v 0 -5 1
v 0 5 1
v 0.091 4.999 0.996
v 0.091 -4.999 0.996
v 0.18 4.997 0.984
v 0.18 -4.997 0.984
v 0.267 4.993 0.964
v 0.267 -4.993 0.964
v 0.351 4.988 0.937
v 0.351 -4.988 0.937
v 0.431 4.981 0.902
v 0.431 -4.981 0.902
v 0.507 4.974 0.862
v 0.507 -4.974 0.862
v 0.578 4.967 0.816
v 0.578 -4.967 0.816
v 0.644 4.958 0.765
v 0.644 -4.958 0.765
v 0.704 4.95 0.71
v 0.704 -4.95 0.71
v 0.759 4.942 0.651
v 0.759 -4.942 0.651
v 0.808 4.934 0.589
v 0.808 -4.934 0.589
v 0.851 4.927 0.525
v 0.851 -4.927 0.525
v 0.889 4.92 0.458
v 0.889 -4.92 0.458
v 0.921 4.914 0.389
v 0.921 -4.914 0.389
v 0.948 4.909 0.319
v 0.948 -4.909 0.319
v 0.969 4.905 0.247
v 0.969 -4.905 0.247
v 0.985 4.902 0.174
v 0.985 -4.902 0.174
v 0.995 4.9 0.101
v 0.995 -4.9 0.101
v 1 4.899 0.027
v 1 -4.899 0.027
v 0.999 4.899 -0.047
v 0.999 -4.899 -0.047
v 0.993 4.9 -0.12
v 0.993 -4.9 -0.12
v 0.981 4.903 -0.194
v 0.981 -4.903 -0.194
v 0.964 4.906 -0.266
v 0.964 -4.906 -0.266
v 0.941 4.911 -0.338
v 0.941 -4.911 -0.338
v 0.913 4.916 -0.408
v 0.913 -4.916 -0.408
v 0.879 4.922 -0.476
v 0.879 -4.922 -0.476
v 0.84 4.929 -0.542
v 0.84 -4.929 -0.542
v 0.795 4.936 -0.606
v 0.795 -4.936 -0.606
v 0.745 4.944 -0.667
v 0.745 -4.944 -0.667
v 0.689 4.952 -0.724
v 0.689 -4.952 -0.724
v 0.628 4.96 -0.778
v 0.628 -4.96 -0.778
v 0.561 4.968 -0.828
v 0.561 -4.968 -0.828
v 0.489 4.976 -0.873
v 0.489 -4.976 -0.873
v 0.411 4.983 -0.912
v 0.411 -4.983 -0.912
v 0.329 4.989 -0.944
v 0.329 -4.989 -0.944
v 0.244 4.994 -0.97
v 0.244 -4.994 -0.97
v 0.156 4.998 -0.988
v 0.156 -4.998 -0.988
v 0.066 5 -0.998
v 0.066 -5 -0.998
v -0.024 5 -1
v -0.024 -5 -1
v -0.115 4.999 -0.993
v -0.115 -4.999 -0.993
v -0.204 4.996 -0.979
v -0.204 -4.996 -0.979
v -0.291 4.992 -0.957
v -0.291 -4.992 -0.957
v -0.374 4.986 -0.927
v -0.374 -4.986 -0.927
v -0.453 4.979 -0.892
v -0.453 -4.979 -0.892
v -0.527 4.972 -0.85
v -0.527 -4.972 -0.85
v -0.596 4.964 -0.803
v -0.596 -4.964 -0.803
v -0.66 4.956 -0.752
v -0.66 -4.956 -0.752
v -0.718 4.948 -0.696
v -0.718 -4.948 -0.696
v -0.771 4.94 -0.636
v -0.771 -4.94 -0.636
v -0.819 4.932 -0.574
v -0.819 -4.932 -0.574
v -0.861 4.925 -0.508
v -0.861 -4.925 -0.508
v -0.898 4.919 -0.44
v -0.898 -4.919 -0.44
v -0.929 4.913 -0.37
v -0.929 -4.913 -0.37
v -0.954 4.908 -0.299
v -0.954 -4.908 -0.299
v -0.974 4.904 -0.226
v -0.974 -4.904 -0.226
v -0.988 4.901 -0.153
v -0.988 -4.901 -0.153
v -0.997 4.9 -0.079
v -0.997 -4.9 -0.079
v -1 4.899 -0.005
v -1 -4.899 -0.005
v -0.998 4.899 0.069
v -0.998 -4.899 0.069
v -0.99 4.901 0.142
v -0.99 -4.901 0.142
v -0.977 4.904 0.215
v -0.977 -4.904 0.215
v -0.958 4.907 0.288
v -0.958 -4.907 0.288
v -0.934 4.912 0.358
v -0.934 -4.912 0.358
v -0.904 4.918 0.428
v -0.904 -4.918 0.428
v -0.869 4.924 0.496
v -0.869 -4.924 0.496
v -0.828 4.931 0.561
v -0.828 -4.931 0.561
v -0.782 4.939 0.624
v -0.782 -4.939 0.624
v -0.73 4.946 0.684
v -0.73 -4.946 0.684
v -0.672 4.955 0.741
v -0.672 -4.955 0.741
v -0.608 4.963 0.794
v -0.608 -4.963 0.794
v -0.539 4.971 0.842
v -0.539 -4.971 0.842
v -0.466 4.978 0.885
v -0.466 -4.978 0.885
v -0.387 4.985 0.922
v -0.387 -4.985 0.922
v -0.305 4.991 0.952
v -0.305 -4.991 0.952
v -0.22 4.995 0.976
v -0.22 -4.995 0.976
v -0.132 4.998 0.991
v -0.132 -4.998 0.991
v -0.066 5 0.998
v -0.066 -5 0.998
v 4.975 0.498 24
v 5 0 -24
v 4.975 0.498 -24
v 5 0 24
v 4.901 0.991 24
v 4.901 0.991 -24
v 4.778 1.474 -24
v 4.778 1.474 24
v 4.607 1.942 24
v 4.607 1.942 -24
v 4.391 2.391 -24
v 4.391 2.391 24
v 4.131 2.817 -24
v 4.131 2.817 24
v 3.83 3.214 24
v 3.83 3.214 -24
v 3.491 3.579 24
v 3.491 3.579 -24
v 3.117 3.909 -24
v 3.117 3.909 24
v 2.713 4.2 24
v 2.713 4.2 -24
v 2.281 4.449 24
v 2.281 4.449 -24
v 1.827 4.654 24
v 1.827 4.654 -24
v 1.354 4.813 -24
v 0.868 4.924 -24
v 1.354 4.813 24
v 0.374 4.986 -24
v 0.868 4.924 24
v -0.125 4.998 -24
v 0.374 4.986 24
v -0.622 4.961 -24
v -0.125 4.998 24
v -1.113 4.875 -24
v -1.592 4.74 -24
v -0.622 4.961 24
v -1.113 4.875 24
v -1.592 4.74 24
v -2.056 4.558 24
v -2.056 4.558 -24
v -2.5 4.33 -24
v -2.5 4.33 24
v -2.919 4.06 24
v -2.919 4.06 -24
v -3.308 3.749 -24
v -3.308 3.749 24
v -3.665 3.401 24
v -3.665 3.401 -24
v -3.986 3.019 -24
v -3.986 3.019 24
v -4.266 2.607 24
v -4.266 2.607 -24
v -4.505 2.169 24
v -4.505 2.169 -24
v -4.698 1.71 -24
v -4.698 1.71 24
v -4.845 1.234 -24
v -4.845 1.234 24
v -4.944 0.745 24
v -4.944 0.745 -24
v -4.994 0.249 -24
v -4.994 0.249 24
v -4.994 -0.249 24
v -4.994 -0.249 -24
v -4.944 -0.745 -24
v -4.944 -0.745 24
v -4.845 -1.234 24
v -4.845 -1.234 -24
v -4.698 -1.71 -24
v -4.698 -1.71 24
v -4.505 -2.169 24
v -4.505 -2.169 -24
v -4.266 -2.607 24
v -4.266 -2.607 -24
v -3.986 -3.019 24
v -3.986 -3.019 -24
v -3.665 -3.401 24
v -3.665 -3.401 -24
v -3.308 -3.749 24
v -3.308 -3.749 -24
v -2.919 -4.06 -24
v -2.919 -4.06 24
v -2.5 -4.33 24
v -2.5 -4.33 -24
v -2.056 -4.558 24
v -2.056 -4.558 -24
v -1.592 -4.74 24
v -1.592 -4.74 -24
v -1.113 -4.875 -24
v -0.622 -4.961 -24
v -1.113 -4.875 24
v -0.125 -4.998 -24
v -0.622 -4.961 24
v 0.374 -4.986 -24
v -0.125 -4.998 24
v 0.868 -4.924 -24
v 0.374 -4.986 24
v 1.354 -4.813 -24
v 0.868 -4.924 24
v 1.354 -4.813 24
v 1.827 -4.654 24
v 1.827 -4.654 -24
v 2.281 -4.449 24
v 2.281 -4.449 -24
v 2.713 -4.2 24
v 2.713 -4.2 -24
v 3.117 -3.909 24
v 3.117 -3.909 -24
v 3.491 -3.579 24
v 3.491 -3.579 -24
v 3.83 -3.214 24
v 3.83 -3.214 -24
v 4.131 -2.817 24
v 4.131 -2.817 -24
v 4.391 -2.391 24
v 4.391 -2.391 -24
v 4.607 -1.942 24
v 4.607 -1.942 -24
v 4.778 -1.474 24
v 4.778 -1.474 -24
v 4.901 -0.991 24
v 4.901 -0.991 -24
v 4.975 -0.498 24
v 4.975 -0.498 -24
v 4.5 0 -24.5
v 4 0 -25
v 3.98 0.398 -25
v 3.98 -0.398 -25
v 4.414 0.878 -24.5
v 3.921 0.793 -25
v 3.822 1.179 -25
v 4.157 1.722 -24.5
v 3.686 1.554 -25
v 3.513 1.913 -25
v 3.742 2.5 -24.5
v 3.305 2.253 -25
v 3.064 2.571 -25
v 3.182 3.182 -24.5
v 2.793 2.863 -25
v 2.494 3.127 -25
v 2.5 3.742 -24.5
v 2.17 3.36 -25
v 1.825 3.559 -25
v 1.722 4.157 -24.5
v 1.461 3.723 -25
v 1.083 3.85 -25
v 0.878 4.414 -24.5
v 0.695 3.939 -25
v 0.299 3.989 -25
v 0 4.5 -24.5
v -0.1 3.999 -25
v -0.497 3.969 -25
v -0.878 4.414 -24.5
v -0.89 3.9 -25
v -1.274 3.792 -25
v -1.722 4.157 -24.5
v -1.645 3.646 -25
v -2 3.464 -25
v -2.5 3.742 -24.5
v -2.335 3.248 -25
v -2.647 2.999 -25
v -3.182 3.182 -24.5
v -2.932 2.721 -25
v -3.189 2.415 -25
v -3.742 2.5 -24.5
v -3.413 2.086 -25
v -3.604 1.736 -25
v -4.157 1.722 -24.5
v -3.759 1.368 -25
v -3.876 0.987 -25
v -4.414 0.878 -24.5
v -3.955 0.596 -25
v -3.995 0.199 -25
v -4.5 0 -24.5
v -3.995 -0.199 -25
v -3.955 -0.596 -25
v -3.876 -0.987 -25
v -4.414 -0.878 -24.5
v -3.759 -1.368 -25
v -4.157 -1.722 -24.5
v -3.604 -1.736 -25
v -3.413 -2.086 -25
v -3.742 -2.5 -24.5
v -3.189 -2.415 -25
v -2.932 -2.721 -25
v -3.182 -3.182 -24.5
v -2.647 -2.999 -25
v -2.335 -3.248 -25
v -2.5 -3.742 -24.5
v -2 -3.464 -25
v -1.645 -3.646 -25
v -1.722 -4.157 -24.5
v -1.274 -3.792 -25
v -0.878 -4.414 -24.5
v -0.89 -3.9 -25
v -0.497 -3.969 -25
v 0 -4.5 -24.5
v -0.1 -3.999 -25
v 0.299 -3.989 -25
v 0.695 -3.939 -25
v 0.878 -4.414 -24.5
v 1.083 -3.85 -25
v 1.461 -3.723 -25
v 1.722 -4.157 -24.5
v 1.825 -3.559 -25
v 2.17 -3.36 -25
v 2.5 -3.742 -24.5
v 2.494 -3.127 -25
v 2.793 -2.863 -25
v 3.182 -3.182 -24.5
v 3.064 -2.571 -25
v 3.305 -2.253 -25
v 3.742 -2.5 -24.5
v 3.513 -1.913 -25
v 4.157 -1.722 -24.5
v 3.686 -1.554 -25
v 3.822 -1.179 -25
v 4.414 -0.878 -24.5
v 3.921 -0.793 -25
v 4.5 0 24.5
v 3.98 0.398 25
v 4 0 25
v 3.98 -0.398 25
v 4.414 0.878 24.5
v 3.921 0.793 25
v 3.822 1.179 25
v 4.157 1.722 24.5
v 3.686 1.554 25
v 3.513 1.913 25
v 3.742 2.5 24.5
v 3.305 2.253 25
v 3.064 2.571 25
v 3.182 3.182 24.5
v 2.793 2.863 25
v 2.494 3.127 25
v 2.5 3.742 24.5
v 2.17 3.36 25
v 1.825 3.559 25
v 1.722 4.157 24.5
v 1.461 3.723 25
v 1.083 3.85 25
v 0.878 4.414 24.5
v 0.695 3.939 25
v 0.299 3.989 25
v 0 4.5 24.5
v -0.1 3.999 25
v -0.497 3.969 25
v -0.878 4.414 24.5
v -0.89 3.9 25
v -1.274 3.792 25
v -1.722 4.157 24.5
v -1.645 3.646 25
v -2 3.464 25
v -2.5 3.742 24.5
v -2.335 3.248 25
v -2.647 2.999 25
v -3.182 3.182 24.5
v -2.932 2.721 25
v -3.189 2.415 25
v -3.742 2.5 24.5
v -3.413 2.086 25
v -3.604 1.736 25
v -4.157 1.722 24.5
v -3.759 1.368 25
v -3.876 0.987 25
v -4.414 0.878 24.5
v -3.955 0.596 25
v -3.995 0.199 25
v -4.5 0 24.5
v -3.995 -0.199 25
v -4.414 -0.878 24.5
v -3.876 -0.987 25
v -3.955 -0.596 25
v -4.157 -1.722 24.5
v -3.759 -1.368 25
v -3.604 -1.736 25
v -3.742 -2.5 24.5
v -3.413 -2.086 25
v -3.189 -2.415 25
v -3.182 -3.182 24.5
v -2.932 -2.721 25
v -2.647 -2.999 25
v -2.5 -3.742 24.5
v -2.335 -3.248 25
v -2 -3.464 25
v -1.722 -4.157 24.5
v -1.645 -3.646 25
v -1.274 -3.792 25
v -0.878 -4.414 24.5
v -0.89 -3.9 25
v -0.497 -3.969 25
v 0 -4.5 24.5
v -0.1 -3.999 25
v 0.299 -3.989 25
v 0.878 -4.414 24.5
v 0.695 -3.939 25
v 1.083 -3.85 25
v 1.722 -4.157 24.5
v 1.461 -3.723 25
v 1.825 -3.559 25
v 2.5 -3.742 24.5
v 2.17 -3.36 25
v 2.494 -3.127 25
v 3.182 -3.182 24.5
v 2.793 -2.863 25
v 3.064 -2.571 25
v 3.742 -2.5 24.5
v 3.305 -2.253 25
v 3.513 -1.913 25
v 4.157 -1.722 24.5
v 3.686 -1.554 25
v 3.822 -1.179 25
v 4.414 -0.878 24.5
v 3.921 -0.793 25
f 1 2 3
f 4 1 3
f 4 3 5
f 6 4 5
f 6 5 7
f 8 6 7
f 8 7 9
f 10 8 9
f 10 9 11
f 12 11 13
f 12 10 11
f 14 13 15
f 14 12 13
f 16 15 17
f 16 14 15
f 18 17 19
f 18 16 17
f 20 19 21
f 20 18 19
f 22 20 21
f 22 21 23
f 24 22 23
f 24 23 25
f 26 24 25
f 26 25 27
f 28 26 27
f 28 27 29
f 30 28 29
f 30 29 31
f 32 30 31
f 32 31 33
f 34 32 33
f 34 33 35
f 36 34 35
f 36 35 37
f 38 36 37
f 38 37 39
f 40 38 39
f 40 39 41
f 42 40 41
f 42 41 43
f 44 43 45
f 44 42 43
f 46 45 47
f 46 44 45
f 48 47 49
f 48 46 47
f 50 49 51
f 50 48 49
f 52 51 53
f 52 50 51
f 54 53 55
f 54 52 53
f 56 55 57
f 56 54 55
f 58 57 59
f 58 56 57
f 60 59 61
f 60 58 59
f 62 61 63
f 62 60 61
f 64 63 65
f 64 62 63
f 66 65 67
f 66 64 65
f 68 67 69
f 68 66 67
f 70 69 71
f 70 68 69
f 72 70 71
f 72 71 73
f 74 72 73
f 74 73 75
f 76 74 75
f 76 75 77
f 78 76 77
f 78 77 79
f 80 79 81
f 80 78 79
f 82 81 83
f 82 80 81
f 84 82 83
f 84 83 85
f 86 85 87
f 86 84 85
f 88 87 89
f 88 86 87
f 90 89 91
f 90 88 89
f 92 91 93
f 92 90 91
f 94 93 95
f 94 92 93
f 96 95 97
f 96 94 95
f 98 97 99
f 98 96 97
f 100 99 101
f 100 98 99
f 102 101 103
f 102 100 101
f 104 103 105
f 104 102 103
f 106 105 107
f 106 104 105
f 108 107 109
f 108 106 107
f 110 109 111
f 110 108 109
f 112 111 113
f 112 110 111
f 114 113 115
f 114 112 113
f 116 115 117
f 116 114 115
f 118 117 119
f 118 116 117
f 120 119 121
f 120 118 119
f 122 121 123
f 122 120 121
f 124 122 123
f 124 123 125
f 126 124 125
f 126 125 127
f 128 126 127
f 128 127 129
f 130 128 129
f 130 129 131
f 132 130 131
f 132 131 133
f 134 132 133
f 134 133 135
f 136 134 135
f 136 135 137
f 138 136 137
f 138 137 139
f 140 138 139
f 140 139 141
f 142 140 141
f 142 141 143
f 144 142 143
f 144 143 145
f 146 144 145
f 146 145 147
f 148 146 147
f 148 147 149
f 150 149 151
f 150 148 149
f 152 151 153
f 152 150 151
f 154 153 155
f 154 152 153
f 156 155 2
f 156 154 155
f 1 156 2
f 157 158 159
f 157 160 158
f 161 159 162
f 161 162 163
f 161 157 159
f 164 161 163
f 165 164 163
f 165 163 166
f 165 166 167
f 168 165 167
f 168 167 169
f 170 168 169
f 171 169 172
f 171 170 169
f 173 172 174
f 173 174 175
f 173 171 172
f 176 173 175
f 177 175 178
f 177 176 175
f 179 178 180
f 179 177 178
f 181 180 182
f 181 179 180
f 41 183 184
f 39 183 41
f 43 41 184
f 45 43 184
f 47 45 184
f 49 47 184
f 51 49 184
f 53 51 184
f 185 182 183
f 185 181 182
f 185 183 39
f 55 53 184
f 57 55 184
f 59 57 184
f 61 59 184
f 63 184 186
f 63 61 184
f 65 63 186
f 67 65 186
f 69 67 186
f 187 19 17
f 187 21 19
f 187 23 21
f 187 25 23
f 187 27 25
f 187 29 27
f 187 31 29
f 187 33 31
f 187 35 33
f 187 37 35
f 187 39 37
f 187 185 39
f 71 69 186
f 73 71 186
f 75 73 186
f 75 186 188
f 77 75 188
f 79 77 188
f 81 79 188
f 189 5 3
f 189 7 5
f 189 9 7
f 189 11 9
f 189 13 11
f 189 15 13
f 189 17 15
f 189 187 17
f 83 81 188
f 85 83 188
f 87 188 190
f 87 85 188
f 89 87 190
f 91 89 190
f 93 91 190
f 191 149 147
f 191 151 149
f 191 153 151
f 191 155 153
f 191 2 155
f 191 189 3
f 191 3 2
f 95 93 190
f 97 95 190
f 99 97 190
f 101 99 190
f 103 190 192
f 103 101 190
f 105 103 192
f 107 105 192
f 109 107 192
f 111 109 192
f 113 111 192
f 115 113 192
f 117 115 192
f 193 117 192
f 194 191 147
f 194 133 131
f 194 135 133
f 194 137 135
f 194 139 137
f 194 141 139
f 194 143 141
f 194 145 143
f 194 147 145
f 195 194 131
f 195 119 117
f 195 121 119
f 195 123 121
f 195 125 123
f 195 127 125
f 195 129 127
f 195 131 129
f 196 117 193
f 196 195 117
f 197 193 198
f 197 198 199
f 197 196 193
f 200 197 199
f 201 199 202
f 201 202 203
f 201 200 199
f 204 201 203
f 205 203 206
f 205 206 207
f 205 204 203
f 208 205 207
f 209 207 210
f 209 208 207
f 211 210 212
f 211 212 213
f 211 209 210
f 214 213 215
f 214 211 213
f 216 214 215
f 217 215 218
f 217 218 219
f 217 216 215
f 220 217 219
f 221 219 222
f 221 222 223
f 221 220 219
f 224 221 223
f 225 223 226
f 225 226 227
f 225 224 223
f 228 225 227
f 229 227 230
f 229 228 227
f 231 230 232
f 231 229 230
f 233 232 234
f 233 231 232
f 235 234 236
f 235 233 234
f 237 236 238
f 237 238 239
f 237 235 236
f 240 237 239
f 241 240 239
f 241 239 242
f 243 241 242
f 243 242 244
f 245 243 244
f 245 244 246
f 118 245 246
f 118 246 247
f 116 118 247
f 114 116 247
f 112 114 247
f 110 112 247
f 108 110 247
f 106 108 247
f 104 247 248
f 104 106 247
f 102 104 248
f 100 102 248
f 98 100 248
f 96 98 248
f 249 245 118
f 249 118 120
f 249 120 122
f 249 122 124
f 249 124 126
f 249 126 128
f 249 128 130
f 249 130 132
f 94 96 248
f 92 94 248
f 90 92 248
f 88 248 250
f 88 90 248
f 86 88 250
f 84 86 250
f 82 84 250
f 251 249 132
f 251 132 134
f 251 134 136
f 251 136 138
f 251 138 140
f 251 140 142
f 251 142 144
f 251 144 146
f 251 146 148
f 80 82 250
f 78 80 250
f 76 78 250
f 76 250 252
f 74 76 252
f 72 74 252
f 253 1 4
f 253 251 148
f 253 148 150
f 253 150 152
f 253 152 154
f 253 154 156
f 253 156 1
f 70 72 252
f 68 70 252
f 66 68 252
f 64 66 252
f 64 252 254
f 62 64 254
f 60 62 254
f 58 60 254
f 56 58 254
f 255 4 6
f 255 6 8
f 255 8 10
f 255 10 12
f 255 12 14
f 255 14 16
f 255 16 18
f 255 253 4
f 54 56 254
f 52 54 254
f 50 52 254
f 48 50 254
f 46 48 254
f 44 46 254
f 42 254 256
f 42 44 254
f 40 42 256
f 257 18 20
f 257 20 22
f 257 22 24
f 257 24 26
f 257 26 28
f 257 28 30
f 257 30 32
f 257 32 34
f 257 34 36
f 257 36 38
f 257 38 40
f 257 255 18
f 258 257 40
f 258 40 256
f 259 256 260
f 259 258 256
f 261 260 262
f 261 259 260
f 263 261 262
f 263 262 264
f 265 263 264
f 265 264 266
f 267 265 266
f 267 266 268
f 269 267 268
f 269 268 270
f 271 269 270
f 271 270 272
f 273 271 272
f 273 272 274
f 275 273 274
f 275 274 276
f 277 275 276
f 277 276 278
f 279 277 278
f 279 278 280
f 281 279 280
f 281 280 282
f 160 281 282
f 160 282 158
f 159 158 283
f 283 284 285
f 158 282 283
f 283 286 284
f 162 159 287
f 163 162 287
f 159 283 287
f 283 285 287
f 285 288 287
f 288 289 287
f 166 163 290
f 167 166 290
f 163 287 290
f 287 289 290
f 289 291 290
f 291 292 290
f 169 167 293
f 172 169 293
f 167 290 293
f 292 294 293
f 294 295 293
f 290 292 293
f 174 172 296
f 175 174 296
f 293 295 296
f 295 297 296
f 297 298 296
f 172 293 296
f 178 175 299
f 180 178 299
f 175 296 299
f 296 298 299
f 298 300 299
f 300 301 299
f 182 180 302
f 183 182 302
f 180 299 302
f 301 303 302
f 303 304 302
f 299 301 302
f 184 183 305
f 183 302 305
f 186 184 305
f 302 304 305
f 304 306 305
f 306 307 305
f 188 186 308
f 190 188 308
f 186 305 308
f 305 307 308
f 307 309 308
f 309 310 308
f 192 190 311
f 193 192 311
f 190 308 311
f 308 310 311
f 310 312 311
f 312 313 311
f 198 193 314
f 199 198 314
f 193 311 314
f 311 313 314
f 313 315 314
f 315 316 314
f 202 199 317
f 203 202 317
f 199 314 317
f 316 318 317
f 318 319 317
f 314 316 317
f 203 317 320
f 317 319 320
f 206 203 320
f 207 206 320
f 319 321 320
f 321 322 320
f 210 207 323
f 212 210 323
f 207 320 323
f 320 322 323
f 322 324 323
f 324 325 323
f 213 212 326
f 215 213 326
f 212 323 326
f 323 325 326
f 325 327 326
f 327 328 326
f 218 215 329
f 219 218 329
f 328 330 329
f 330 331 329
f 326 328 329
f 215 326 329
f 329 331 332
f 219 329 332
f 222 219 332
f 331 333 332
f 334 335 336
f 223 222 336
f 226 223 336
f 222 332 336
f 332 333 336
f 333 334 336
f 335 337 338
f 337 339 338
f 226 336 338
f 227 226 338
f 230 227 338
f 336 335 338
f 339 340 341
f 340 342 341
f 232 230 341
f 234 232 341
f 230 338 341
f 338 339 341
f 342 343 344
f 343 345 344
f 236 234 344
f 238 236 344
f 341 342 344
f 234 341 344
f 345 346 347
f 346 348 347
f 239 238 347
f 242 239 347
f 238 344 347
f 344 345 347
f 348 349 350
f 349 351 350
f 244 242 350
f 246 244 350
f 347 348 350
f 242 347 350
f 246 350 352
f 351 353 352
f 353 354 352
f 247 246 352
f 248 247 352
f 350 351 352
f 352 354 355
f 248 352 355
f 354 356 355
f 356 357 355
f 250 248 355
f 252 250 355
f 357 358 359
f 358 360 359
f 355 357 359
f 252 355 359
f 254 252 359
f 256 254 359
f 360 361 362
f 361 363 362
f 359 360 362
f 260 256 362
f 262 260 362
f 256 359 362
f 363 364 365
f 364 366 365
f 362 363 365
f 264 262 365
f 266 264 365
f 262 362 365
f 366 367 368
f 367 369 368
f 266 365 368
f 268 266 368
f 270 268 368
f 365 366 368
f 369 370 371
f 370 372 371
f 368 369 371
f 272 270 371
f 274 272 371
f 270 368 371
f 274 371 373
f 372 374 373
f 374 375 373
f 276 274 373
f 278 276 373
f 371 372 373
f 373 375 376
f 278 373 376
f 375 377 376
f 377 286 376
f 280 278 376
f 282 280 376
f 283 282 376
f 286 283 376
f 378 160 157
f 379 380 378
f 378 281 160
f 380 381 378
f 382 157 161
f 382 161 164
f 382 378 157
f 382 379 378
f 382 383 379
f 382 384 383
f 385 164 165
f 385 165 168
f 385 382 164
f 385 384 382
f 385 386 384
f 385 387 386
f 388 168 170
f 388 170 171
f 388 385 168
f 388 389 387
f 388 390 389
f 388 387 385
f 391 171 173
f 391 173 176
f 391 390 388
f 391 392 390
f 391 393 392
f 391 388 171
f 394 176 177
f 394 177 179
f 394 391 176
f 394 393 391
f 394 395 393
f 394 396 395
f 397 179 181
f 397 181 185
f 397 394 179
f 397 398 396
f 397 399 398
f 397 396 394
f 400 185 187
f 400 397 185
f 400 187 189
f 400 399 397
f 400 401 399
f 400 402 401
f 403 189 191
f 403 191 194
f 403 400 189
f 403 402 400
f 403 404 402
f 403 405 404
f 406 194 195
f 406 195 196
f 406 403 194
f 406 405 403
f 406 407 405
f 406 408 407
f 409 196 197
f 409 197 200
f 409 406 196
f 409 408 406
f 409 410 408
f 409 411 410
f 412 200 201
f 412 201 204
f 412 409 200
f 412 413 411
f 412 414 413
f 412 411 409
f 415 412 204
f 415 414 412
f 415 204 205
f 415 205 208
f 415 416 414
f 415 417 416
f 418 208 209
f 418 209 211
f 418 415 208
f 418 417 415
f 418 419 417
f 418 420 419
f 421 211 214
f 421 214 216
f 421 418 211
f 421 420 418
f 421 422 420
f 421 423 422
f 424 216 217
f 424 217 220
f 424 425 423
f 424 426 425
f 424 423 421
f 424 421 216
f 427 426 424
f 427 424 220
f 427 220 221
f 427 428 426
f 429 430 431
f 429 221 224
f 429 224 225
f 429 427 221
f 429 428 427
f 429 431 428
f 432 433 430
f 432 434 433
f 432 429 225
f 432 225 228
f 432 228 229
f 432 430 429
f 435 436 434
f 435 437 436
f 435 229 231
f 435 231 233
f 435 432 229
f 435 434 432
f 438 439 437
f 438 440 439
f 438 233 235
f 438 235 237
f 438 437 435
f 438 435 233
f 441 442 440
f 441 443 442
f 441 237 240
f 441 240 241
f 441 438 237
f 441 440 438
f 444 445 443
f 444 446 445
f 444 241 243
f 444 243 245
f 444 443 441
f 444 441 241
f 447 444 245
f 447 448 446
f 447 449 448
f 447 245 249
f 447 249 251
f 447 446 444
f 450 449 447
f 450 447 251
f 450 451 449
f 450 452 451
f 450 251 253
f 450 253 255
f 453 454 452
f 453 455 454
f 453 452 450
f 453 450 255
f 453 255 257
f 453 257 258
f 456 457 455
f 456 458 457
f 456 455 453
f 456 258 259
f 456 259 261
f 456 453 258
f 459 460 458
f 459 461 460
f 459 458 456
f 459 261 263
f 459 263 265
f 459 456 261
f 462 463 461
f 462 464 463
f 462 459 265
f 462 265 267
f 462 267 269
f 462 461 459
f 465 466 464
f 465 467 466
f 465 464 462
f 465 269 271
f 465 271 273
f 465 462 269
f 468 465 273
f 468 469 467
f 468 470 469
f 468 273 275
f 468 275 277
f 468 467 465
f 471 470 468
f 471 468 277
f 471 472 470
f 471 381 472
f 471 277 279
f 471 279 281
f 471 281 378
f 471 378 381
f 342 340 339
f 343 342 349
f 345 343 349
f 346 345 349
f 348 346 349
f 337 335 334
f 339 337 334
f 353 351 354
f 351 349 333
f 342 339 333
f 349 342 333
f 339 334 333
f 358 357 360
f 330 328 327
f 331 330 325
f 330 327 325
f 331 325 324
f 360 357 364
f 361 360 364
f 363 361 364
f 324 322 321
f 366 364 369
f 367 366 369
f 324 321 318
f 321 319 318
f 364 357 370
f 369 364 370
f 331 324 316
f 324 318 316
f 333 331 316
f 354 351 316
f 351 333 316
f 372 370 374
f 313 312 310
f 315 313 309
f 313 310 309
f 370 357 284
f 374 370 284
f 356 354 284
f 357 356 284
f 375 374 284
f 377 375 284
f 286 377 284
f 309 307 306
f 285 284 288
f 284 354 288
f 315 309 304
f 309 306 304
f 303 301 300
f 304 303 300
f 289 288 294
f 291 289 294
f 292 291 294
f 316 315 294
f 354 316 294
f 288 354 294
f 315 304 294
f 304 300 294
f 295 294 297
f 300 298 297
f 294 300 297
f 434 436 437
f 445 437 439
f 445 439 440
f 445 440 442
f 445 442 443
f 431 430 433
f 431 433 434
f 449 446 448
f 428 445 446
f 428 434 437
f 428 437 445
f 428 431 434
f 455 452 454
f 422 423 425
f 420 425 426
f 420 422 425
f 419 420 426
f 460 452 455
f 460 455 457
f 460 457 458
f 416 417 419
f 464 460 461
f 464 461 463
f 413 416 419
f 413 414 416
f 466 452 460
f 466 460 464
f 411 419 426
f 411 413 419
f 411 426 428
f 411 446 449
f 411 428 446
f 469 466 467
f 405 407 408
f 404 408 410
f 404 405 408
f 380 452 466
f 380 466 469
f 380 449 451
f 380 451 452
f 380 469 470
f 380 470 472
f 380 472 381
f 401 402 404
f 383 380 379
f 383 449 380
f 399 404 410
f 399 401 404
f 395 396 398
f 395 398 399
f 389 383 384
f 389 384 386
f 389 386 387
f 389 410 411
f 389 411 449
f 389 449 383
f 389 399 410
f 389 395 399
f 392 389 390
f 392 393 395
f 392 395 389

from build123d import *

# Parameters (mm, degrees)
SKETCH_1_R               = 5
EXTRUDE_1_DEPTH          = 25
CHAMFER_1_SIZE           = 1
CUT_EXTRUDE_1_DEPTH      = 26.980762114
CUT_EXTRUDE_1_DEPTH_BACK = 26.980762114
SKETCH_2_R               = 1


with BuildPart() as part:
    # 草图1 → 凸台-拉伸1 (new, symmetric)
    with BuildSketch(Plane.XY):
        Circle(SKETCH_1_R)
    extrude(amount=EXTRUDE_1_DEPTH, both=True)

    # 倒角1
    chamfer_1_edges = [part.edges().sort_by_distance(p)[0] for p in [
        (-5, 0, -25),
        (-5, 0, 25),
    ]]
    chamfer(chamfer_1_edges, length=CHAMFER_1_SIZE)

    # 草图2 → 切除-拉伸1 (cut, two sides: drawn at the far end of the back side and taken through both)
    with BuildSketch(Plane(origin=(0, 0, 0), x_dir=(1, 0, 0), z_dir=(0, 1, 0)).offset(-CUT_EXTRUDE_1_DEPTH_BACK)):
        with Locations(Location((0, 0, 0), (0, 0, 270))):
            Circle(SKETCH_2_R)
    extrude(amount=CUT_EXTRUDE_1_DEPTH + CUT_EXTRUDE_1_DEPTH_BACK, mode=Mode.SUBTRACT)


solid = part.part
